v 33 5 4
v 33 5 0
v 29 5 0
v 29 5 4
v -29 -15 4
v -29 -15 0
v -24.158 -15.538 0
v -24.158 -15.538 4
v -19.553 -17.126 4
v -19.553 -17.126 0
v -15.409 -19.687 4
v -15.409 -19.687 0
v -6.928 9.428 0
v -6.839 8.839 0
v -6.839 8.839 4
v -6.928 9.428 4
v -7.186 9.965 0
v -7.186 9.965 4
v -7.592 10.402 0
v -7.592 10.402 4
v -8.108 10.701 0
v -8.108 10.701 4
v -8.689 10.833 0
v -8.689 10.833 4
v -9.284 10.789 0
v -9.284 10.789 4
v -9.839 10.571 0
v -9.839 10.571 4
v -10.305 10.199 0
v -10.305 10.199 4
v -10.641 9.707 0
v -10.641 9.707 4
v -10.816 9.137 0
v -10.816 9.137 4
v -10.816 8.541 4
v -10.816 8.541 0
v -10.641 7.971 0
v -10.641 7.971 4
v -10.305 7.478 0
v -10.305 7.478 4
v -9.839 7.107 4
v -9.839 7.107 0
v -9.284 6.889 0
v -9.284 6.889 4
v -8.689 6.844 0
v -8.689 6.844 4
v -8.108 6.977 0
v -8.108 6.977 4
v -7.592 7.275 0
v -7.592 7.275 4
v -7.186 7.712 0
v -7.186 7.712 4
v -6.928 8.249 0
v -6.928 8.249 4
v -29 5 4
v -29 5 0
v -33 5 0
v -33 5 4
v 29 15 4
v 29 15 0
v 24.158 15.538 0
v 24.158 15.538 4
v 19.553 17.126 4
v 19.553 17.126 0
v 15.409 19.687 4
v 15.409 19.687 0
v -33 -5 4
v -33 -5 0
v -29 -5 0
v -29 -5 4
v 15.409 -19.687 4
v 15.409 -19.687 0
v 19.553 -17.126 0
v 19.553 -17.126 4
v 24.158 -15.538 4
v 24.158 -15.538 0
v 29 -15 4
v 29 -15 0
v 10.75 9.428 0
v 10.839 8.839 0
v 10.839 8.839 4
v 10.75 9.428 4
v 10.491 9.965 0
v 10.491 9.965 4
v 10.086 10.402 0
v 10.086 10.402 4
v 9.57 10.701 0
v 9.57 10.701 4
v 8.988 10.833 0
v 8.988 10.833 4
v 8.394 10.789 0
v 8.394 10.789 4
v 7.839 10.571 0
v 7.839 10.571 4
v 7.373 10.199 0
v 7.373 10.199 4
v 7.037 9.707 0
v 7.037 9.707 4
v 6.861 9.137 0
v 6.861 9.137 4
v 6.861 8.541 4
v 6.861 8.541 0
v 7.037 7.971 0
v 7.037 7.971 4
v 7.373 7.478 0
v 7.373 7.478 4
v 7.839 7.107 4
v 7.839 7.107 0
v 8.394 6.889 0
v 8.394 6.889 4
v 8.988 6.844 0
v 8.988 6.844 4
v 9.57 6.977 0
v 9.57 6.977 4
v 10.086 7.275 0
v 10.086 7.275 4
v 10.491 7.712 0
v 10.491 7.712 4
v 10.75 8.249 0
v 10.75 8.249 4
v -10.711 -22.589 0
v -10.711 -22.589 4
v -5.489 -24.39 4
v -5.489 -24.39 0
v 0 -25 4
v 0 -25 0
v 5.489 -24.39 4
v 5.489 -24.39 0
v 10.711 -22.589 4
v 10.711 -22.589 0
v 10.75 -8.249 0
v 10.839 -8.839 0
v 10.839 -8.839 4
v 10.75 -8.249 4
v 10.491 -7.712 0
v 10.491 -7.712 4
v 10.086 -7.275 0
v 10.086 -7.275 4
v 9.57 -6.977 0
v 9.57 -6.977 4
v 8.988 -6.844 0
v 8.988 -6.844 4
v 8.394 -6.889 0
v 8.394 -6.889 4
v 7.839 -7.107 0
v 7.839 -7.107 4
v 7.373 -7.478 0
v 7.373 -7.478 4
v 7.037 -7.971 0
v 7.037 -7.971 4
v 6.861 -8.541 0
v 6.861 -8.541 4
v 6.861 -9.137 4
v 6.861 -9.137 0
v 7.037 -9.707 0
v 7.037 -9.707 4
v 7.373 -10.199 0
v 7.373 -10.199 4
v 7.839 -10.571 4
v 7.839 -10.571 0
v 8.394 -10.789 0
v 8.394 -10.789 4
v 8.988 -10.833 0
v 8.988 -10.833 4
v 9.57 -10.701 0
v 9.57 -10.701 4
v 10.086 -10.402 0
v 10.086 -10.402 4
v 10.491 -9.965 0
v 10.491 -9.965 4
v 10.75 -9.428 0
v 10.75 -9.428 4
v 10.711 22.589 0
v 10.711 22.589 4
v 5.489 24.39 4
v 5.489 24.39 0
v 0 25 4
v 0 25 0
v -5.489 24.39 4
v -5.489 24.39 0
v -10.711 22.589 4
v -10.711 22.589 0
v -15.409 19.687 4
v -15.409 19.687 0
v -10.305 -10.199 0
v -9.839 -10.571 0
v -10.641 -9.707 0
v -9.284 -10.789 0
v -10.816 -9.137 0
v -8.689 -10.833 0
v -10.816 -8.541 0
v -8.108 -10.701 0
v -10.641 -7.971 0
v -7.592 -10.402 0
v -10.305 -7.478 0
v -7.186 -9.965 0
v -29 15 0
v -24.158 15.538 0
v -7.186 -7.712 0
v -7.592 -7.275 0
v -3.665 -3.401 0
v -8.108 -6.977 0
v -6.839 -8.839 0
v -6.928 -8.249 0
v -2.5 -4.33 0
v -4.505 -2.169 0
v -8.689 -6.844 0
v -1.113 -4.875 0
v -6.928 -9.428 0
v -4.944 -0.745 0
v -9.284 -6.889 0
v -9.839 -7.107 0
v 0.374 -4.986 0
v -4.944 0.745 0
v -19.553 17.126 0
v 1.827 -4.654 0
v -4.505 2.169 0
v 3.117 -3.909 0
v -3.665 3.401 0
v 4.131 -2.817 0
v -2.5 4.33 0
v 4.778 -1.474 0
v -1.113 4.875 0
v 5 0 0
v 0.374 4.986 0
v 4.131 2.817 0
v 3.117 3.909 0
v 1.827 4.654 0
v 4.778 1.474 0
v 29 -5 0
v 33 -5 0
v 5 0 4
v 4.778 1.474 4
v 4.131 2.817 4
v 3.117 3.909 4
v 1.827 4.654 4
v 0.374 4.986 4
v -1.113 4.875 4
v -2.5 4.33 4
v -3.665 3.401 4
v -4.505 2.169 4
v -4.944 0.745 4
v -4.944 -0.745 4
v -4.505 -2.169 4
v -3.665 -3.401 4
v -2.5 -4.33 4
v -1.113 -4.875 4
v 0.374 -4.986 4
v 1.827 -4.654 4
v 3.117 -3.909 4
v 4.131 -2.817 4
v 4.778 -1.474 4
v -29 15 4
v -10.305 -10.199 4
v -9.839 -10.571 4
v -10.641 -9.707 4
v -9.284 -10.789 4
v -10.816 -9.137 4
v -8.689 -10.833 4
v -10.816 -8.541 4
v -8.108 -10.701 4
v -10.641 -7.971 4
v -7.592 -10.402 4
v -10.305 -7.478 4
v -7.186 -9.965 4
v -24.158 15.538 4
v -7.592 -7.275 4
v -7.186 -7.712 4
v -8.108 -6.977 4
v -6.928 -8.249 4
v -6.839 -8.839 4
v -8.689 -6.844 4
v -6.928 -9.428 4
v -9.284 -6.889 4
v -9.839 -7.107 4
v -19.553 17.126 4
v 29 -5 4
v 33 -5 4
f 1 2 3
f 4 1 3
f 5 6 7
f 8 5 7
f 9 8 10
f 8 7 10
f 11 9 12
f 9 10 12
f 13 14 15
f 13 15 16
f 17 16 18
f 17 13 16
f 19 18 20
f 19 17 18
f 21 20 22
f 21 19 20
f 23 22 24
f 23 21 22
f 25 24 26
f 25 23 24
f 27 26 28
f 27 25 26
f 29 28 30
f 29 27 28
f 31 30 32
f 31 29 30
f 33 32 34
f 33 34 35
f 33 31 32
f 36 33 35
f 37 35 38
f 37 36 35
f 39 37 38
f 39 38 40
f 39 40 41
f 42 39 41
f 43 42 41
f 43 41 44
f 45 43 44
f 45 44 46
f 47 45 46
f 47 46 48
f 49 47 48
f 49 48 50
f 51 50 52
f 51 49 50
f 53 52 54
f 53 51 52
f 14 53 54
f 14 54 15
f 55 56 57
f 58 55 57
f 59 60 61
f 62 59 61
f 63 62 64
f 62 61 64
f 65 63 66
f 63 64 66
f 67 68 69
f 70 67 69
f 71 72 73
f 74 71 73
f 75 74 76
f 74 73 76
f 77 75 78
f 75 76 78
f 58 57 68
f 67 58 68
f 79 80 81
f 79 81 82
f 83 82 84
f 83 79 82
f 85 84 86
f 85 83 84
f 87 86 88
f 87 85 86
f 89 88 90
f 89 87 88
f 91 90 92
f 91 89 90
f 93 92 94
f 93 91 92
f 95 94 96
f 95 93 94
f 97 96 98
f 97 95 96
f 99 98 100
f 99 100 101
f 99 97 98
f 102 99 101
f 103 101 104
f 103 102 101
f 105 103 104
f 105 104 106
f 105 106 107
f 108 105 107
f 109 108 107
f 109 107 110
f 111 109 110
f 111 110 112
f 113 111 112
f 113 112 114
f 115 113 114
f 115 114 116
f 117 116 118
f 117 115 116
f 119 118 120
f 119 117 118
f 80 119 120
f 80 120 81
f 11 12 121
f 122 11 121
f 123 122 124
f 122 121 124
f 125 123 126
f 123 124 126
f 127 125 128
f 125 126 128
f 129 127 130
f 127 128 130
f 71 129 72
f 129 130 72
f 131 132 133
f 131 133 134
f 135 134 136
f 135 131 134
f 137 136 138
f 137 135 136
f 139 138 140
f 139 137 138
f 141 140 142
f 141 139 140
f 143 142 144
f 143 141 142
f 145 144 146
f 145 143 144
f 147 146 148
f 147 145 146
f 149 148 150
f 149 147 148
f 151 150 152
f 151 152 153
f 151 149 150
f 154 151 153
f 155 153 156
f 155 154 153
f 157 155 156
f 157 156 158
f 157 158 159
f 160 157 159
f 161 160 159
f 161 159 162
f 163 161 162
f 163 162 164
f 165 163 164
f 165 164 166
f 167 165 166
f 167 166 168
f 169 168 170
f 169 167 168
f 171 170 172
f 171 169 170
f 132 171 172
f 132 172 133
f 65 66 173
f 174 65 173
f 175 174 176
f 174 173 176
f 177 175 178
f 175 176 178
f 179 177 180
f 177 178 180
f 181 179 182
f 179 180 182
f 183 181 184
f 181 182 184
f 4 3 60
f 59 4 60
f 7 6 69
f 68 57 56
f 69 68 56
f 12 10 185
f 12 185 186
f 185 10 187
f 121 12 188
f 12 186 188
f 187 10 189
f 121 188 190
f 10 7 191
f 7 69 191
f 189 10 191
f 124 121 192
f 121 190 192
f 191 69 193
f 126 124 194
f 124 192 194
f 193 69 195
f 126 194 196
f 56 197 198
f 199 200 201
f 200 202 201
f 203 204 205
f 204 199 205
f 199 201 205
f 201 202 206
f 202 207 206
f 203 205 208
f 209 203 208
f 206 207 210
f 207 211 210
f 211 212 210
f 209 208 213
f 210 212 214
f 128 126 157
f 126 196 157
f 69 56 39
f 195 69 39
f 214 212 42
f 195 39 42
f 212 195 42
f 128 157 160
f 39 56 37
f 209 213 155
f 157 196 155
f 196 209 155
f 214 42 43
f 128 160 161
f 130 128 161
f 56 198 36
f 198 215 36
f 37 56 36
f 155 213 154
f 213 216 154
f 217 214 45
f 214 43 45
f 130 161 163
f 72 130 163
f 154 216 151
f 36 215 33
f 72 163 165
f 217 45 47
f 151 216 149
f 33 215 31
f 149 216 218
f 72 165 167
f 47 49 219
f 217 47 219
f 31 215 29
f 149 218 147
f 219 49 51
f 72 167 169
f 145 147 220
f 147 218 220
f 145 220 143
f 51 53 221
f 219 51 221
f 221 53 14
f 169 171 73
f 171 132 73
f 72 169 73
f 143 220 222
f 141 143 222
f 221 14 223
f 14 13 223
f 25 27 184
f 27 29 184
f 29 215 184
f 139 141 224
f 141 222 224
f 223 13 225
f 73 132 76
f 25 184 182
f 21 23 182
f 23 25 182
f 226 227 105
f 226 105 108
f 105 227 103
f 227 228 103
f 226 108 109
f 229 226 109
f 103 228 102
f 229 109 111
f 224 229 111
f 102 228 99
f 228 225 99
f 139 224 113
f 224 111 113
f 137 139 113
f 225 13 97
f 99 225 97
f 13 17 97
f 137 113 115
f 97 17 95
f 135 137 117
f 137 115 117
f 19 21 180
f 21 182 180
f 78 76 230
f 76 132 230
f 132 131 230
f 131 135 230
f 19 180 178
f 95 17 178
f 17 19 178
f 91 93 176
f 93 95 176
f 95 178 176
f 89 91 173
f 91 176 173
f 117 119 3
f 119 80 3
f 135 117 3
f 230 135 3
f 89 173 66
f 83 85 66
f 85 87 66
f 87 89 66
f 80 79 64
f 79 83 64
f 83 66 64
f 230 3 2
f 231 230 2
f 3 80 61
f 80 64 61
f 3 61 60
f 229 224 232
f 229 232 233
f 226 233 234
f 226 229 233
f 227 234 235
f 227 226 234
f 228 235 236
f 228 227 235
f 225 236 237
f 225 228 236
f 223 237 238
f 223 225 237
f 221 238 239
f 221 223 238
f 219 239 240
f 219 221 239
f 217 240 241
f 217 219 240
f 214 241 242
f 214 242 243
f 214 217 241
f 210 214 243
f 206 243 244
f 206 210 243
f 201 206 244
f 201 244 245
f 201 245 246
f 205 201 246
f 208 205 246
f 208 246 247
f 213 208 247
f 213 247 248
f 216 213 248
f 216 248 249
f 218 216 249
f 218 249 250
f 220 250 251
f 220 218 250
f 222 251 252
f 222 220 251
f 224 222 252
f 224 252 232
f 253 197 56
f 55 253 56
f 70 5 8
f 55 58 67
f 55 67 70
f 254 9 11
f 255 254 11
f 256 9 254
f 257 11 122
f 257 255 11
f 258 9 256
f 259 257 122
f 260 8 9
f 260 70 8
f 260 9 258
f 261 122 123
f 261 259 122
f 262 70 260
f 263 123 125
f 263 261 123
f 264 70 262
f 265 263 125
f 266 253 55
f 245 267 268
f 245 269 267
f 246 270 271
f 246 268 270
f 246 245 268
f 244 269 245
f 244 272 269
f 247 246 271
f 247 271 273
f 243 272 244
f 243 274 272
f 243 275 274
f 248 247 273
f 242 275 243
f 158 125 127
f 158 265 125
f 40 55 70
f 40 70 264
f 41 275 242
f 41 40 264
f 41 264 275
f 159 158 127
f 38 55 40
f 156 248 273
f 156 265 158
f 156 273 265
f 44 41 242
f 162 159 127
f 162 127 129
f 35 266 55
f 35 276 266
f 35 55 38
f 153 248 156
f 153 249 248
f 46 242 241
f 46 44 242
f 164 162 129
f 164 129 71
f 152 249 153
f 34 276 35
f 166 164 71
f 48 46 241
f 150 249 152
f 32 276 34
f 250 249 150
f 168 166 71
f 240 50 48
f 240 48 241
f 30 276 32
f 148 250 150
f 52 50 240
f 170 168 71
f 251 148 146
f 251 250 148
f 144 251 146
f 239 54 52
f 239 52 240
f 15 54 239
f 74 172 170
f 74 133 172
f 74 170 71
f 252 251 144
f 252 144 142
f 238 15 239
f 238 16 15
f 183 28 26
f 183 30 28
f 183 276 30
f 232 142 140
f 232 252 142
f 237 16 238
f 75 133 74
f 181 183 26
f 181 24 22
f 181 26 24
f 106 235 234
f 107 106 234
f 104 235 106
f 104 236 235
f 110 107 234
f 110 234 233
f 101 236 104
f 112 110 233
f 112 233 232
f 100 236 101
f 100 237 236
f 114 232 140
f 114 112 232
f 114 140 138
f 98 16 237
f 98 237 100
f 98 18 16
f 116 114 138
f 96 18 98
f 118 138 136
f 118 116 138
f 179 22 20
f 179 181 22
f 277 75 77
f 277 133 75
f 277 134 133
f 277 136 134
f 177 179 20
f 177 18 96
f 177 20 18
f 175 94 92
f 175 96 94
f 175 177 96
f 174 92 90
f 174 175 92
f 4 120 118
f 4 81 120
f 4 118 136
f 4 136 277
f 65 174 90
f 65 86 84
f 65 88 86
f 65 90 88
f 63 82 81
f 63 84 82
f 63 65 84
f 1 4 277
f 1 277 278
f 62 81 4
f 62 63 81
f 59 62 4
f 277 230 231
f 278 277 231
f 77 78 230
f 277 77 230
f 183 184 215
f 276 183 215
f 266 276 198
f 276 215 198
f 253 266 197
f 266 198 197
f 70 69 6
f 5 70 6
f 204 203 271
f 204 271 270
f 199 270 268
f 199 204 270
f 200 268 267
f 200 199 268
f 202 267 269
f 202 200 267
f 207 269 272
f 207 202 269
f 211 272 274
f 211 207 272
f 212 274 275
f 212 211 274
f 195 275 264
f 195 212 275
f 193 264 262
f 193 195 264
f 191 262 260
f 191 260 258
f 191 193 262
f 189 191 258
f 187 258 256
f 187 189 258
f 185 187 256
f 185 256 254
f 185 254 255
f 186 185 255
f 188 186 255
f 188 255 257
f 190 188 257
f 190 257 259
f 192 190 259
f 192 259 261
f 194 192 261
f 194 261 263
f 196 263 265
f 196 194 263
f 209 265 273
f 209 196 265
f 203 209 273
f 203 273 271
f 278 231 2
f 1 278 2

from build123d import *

# Parameters (mm, degrees)
ESQUISSE1_R        = 5
ESQUISSE1_R_2      = 2
BOSS_EXTRU_1_DEPTH = 4


with BuildPart() as part:
    # Esquisse1 → Boss.-Extru.1 (new body)
    with BuildSketch(Plane.XY):
        with BuildLine():
            Line((33, -5), (33, 5))
            Line((33, 5), (29, 5))
            Line((29, 5), (29, 15))
            ThreePointArc((29, 15), (21.811905433, 16.204525755), (15.409139214, 19.686503719))
            ThreePointArc((15.409139214, 19.686503719), (0, 25), (-15.409139214, 19.686503719))
            ThreePointArc((-15.409139214, 19.686503719), (-21.811905433, 16.204525755), (-29, 15))
            Line((-29, 15), (-29, 5))
            Line((-29, 5), (-33, 5))
            Line((-33, 5), (-33, -5))
            Line((-33, -5), (-29, -5))
            Line((-29, -5), (-29, -15))
            ThreePointArc((-29, -15), (-21.811905433, -16.204525755), (-15.409139214, -19.686503719))
            ThreePointArc((-15.409139214, -19.686503719), (0, -25), (15.409139214, -19.686503719))
            ThreePointArc((15.409139214, -19.686503719), (21.811905433, -16.204525755), (29, -15))
            Line((29, -15), (29, -5))
            Line((29, -5), (33, -5))
        make_face()
        Circle(ESQUISSE1_R, mode=Mode.SUBTRACT)
        with Locations((-8.838834765, 8.838834765)):
            Circle(ESQUISSE1_R_2, mode=Mode.SUBTRACT)
        with Locations((8.838834765, 8.838834765)):
            Circle(ESQUISSE1_R_2, mode=Mode.SUBTRACT)
        with Locations((8.838834765, -8.838834765)):
            Circle(ESQUISSE1_R_2, mode=Mode.SUBTRACT)
        with Locations((-8.838834765, -8.838834765)):
            Circle(ESQUISSE1_R_2, mode=Mode.SUBTRACT)
    extrude(amount=BOSS_EXTRU_1_DEPTH)


solid = part.part
